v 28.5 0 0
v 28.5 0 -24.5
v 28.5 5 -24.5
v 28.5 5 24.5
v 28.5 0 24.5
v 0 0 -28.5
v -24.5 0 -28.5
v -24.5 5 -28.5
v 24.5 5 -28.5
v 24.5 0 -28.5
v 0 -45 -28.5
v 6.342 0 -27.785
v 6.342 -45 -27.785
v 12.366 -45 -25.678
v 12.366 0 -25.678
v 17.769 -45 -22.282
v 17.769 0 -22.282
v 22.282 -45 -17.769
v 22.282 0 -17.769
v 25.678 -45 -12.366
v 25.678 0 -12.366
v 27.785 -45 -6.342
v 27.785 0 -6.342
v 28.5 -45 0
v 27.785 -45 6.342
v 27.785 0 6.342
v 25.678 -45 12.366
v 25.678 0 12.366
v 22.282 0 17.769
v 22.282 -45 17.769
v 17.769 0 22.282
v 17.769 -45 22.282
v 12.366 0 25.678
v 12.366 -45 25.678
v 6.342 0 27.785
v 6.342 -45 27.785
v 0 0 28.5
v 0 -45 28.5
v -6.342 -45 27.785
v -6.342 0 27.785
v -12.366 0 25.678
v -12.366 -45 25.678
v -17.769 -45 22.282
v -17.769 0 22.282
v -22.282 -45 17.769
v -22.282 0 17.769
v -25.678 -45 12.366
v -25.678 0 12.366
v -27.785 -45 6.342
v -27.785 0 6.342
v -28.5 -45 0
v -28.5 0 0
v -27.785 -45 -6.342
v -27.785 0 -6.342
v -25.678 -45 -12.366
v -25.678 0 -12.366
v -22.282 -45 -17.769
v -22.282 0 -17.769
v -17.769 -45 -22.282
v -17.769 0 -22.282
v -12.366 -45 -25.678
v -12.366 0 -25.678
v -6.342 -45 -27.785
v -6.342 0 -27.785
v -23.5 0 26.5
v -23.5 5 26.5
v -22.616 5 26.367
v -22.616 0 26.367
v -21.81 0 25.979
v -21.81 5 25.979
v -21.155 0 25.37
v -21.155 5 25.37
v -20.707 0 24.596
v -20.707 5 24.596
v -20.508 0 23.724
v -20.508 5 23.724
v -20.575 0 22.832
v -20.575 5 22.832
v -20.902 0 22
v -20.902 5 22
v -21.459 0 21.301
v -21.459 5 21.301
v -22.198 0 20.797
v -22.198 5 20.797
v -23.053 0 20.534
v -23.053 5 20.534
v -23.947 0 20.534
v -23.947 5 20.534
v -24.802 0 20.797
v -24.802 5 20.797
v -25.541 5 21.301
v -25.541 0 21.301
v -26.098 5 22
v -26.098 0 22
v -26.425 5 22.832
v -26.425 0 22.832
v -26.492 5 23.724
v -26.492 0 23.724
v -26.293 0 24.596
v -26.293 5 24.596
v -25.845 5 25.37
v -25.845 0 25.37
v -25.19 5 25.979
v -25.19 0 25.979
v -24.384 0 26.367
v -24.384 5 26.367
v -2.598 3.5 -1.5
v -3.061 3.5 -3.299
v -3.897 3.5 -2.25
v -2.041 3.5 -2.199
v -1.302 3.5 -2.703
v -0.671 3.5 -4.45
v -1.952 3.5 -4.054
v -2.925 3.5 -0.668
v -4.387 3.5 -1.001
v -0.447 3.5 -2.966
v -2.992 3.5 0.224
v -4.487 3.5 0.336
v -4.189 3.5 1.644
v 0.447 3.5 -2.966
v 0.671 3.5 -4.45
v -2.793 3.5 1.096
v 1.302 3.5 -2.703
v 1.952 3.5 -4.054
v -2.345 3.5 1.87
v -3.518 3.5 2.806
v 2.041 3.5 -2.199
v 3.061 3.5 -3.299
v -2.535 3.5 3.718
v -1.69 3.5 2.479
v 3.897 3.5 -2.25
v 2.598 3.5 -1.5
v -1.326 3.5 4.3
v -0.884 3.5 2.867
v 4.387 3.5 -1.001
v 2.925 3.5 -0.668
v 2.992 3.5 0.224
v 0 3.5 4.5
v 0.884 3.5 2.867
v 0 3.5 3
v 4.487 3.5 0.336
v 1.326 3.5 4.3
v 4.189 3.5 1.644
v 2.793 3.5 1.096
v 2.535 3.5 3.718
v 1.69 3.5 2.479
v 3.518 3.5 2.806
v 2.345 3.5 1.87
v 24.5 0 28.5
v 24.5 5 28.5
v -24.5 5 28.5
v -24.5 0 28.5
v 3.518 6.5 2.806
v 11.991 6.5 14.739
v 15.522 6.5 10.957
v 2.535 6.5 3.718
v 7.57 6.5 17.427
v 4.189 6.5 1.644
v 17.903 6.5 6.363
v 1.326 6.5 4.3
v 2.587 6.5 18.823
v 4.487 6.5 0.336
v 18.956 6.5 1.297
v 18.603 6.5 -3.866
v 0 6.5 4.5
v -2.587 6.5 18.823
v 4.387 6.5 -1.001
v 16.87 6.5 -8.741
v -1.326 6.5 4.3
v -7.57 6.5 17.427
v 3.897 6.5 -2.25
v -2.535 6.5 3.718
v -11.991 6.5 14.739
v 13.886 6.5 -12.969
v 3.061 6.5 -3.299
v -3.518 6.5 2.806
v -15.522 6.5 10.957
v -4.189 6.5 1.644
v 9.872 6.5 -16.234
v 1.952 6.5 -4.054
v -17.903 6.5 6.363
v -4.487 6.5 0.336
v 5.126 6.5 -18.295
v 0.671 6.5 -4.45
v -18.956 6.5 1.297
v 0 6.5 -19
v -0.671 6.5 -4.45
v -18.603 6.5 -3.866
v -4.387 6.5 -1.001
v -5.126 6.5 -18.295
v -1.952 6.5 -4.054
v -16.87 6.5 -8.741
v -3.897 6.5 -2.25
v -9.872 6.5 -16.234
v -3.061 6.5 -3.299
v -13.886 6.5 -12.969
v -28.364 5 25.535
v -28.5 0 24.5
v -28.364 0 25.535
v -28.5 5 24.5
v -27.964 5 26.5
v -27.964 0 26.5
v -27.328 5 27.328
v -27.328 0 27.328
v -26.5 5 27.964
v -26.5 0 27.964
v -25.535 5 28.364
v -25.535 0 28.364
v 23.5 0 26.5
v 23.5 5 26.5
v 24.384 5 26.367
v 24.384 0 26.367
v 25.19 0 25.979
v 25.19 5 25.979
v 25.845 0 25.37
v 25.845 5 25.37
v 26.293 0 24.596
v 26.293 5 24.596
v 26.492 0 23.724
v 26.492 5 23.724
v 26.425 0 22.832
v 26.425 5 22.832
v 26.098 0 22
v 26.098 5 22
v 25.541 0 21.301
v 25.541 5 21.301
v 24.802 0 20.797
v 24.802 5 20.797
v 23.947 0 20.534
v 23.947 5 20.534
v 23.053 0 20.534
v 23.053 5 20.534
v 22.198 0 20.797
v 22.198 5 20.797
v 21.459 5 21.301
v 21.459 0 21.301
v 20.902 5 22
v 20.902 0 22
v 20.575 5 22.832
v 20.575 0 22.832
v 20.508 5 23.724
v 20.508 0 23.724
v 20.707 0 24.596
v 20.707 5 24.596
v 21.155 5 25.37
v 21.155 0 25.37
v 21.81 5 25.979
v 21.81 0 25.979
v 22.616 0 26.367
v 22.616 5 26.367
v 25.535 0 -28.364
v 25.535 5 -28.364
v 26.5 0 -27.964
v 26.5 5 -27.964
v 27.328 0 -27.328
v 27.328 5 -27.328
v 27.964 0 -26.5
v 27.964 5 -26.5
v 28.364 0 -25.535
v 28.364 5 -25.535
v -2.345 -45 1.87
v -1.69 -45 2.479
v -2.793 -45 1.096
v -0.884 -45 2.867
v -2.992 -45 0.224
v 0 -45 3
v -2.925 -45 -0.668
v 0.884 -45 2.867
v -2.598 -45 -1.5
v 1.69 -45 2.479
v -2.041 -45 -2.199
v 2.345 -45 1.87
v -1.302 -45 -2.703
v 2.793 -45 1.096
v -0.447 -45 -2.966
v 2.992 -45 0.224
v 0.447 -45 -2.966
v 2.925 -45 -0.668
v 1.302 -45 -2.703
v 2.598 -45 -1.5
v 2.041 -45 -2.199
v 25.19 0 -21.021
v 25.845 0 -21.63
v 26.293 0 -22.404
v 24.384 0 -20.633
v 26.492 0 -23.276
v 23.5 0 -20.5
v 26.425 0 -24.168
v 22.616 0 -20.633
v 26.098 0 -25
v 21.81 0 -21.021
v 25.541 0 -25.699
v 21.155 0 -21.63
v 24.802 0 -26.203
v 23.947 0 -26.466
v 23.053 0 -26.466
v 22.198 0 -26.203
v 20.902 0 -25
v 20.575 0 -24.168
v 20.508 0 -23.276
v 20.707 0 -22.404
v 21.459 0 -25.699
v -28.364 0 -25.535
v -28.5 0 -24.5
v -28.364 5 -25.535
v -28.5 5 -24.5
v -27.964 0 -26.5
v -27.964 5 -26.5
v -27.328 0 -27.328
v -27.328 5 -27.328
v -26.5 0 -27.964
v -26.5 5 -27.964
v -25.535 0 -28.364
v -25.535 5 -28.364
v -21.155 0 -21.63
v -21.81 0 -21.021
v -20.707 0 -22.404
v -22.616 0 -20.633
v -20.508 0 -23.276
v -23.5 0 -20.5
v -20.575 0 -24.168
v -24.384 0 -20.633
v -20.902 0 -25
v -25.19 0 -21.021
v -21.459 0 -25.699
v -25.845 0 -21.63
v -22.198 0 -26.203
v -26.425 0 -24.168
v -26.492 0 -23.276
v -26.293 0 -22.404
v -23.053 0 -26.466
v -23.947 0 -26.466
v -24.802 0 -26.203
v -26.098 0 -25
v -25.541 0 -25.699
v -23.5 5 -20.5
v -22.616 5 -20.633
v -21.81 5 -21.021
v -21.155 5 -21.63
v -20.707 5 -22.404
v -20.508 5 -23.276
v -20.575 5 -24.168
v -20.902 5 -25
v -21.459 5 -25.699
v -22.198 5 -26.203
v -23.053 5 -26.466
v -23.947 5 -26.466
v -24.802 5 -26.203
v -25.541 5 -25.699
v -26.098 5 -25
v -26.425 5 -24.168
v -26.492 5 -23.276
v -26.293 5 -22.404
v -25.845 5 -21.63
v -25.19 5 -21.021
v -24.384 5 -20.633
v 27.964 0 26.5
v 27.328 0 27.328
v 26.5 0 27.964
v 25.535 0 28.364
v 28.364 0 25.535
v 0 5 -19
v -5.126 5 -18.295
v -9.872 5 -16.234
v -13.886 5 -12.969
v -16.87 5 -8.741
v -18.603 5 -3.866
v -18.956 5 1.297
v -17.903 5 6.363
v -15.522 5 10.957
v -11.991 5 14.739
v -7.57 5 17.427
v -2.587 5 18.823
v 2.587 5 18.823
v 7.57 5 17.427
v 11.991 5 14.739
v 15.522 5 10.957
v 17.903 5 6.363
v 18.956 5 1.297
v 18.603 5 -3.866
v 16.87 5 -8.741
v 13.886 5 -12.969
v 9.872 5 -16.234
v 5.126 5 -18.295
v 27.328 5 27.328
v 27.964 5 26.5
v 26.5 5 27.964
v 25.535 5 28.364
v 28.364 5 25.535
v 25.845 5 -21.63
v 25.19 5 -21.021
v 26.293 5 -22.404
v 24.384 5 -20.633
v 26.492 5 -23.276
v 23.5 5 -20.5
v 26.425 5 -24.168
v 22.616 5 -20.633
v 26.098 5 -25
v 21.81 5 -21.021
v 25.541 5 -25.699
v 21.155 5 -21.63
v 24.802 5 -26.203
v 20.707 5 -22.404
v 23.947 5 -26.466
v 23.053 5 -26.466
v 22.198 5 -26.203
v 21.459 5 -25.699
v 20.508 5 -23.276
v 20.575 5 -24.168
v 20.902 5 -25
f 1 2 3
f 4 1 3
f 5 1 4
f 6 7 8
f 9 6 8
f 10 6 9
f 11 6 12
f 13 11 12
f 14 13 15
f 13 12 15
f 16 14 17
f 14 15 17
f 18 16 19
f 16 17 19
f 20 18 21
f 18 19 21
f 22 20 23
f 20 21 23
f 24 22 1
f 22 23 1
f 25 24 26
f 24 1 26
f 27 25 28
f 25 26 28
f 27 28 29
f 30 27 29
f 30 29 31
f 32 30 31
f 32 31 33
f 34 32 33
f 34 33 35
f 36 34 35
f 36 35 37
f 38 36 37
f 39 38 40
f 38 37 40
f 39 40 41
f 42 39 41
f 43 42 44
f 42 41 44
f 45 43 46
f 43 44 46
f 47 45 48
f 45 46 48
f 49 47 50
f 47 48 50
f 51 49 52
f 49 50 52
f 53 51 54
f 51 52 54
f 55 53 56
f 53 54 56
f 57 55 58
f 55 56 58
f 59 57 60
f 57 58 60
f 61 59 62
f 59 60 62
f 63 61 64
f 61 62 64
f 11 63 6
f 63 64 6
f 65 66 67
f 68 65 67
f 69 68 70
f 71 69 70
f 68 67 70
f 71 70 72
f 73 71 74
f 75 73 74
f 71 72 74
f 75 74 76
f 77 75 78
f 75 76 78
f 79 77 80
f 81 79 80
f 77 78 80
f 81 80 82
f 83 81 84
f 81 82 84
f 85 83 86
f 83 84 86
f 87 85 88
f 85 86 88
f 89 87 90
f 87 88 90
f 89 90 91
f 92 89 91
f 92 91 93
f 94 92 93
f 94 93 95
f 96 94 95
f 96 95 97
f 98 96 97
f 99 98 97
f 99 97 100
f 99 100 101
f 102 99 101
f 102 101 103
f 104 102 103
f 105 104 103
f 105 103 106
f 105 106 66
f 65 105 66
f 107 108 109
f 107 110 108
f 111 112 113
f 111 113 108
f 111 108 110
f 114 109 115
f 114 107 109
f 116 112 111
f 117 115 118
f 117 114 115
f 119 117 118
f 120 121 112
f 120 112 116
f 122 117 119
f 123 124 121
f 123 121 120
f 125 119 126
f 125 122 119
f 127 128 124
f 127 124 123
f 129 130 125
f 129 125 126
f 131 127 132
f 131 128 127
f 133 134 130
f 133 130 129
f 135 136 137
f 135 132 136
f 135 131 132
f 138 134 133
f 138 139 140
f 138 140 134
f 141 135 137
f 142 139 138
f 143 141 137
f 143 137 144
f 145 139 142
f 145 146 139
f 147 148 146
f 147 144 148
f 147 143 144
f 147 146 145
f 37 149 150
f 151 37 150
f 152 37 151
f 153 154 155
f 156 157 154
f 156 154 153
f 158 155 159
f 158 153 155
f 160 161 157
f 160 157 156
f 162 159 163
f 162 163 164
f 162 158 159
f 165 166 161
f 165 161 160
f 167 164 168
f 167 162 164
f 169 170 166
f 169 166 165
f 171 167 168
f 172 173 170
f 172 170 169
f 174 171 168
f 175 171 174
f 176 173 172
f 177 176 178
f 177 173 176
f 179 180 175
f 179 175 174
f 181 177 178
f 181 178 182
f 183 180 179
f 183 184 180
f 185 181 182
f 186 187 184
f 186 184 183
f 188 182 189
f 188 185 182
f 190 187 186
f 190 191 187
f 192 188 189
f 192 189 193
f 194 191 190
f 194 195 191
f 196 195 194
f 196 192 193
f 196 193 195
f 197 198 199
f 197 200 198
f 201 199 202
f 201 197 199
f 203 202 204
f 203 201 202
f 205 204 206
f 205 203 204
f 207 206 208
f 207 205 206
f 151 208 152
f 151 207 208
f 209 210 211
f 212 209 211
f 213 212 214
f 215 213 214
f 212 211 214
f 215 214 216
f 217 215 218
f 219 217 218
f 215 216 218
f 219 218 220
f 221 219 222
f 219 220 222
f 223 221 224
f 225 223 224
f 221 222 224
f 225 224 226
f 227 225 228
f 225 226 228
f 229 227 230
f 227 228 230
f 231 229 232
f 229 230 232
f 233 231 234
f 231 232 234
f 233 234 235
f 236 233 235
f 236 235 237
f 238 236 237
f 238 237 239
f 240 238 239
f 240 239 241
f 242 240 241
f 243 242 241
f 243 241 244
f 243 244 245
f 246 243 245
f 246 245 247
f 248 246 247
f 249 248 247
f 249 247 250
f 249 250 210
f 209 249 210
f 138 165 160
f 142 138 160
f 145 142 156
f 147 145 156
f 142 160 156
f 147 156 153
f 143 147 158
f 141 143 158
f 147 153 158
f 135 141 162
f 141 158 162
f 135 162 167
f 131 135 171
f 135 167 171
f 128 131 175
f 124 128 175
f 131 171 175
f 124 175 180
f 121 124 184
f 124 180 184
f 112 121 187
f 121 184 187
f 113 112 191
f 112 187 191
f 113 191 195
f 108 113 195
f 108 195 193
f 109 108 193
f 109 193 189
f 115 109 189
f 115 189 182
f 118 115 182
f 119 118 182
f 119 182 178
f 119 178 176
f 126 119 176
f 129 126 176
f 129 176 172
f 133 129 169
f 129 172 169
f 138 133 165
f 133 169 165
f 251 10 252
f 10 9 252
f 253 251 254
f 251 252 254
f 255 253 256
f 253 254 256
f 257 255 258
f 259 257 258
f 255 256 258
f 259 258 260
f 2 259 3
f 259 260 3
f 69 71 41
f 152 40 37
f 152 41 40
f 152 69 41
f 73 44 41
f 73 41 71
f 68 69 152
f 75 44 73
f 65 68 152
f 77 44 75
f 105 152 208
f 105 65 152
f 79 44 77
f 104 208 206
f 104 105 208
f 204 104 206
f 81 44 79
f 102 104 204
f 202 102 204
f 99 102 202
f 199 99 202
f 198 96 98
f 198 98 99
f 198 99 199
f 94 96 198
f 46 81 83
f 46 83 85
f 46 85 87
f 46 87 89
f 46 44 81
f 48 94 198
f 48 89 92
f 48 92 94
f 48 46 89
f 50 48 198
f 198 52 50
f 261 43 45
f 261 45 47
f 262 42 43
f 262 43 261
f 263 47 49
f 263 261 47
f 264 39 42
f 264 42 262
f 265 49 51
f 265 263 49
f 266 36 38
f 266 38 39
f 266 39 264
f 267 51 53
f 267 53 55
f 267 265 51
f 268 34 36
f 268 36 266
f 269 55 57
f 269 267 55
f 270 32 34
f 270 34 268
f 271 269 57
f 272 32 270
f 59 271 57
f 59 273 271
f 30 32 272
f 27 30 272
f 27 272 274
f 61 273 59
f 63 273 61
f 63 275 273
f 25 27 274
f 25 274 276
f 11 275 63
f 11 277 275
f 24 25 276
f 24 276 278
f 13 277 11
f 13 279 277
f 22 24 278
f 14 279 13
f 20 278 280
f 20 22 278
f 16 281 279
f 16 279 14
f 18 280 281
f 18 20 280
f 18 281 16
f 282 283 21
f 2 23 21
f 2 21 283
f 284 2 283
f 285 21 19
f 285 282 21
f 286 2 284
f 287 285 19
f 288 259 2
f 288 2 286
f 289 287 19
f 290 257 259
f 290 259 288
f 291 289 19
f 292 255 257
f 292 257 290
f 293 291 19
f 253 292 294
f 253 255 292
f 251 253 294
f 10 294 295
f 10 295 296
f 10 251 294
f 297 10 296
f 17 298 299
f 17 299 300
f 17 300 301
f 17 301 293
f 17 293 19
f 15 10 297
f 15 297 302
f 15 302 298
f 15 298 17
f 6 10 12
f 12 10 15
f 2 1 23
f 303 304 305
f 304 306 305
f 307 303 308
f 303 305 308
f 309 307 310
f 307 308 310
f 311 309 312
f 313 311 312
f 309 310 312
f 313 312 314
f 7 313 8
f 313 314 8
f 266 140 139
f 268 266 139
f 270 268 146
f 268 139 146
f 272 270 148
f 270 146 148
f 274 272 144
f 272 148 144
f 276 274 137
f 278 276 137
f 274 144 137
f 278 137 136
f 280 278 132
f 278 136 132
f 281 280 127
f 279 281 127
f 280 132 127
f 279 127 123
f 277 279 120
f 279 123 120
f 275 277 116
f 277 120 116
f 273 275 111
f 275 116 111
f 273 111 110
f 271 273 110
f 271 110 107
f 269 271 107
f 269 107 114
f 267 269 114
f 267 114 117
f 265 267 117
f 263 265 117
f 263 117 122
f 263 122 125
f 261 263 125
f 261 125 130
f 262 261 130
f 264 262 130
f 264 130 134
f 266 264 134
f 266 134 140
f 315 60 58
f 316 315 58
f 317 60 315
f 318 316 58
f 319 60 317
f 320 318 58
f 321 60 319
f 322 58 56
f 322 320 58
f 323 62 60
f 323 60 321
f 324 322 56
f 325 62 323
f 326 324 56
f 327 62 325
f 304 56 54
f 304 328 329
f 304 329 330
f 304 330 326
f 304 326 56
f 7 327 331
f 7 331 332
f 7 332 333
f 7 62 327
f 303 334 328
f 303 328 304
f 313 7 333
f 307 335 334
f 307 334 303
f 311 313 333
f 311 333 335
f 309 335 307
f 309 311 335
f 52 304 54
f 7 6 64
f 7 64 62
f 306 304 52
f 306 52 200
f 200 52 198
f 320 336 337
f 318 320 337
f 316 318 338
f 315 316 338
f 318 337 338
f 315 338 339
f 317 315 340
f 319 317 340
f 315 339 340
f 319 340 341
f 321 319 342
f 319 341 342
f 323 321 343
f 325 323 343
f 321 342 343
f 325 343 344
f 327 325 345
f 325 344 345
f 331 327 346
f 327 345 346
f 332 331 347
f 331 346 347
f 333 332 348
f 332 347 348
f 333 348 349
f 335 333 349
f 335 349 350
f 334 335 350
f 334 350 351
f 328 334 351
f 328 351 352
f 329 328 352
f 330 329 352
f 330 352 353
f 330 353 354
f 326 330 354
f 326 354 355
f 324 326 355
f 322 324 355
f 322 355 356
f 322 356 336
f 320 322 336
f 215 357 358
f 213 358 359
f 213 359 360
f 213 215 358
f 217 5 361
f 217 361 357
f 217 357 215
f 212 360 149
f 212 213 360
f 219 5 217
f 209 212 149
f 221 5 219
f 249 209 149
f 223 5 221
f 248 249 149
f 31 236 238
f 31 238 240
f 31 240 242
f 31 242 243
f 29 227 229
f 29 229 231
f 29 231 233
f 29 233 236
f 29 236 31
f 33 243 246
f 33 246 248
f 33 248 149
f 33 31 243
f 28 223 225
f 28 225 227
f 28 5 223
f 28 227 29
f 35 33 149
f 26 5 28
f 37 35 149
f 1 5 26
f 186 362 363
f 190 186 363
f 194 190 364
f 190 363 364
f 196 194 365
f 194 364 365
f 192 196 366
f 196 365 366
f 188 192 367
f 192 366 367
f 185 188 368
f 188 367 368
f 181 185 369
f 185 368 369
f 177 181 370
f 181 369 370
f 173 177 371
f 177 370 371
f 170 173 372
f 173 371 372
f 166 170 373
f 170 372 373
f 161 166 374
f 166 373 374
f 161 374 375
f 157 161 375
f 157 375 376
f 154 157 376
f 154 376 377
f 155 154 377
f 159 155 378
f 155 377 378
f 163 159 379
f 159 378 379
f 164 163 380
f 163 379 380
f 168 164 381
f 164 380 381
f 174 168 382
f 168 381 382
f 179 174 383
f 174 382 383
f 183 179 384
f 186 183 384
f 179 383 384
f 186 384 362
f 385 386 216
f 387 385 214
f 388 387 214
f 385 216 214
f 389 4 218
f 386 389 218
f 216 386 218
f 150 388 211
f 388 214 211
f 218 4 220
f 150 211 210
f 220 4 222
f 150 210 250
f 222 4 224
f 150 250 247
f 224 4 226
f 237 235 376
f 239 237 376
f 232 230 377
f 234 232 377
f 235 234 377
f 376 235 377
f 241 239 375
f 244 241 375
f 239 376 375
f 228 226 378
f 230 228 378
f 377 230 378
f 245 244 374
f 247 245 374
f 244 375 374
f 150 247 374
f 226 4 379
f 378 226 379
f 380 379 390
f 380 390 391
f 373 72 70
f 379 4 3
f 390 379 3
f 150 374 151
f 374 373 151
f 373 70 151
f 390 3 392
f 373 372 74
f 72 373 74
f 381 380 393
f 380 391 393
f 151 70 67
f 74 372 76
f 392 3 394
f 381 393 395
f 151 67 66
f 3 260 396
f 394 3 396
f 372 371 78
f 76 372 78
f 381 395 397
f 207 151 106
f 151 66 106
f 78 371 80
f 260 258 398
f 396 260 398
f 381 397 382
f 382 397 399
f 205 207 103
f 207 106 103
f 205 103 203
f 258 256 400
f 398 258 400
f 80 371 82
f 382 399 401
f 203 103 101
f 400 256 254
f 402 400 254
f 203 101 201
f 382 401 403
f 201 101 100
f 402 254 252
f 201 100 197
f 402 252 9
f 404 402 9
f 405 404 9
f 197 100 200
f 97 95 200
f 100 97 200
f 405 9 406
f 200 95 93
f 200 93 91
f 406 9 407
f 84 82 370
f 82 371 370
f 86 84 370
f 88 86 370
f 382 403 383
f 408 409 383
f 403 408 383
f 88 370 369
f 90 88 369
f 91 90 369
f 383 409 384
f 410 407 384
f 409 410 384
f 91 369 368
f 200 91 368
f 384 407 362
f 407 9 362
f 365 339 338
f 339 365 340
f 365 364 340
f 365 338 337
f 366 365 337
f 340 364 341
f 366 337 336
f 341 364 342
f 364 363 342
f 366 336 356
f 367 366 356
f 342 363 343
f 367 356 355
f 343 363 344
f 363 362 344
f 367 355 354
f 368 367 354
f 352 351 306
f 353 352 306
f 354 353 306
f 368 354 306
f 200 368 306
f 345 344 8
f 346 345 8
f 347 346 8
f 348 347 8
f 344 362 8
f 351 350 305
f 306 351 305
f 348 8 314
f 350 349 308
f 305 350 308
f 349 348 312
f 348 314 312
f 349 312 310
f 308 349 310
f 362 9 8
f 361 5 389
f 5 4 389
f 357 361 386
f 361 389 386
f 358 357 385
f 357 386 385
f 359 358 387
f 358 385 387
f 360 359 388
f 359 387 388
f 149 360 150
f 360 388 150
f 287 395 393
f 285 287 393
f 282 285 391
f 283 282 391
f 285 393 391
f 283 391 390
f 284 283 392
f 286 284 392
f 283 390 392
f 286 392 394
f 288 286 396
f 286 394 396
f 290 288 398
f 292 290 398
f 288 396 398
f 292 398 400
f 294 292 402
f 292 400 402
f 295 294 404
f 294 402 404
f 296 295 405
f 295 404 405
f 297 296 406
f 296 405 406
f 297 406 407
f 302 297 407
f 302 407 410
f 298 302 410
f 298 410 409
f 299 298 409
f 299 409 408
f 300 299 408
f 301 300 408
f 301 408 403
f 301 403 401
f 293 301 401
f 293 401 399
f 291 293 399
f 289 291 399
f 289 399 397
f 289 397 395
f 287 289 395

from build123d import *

# Parameters (mm, degrees)
BOSS_EXTRUDE1_DEPTH = 5
FILLET1_R           = 4
SKETCH2_R           = 3
CUT_EXTRUDE1_DEPTH  = 41.614036982
SKETCH3_R           = 28.5
BOSS_EXTRUDE2_DEPTH = 45
SKETCH4_R           = 19
BOSS_EXTRUDE3_DEPTH = 1.5
SKETCH5_R           = 4.5
CUT_EXTRUDE2_DEPTH  = 3
SKETCH6_R           = 3
CUT_EXTRUDE3_DEPTH  = 64.06147794


with BuildPart() as part:
    # Sketch1 → Boss-Extrude1 (new body)
    with BuildSketch(Plane(origin=(0, 0, 0), x_dir=(1, 0, 0), z_dir=(0, 1, 0))):
        Polygon((-28.5, 0), (-28.5, 28.5), (28.5, 28.5), (28.5, -28.5), (-28.5, -28.5), align=None)
    extrude(amount=BOSS_EXTRUDE1_DEPTH)

    # Fillet1
    fillet1_edges = [part.edges().sort_by_distance(p)[0] for p in [
        (-28.5, 2.5, -28.5),
        (28.5, 2.5, -28.5),
        (28.5, 2.5, 28.5),
        (-28.5, 2.5, 28.5),
    ]]
    fillet(fillet1_edges, radius=FILLET1_R)

    # Sketch2 → Cut-Extrude1 (cut, through all)
    with BuildSketch(Plane(origin=(0, 5, 0), x_dir=(1, 0, 0), z_dir=(0, 1, 0))):
        with Locations(Location((-23.5, 23.5, 0), (0, 0, 270))):
            Circle(SKETCH2_R)
        with Locations(Location((23.5, 23.5, 0), (0, 0, 270))):
            Circle(SKETCH2_R)
        with Locations(Location((23.5, -23.5, 0), (0, 0, 270))):
            Circle(SKETCH2_R)
        with Locations(Location((-23.5, -23.5, 0), (0, 0, 270))):
            Circle(SKETCH2_R)
    extrude(amount=-CUT_EXTRUDE1_DEPTH, mode=Mode.SUBTRACT)

    # Sketch3 → Boss-Extrude2 (add)
    with BuildSketch(Plane.XZ):
        with Locations(Location((0, 0, 0), (0, 0, 270))):
            Circle(SKETCH3_R)
    extrude(amount=BOSS_EXTRUDE2_DEPTH)

    # Sketch4 → Boss-Extrude3 (add)
    with BuildSketch(Plane(origin=(0, 5, 0), x_dir=(1, 0, 0), z_dir=(0, 1, 0))):
        with Locations(Location((0, 0, 0), (0, 0, 90))):
            Circle(SKETCH4_R)
    extrude(amount=BOSS_EXTRUDE3_DEPTH)

    # Sketch5 → Cut-Extrude2 (cut)
    with BuildSketch(Plane(origin=(0, 6.5, 0), x_dir=(1, 0, 0), z_dir=(0, 1, 0))):
        with Locations(Location((0, 0, 0), (0, 0, 270))):
            Circle(SKETCH5_R)
    extrude(amount=-CUT_EXTRUDE2_DEPTH, mode=Mode.SUBTRACT)

    # Sketch6 → Cut-Extrude3 (cut, through all)
    with BuildSketch(Plane(origin=(0, 3.5, 0), x_dir=(1, 0, 0), z_dir=(0, 1, 0))):
        with Locations(Location((0, 0, 0), (0, 0, 270))):
            Circle(SKETCH6_R)
    extrude(amount=-CUT_EXTRUDE3_DEPTH, mode=Mode.SUBTRACT)


solid = part.part
